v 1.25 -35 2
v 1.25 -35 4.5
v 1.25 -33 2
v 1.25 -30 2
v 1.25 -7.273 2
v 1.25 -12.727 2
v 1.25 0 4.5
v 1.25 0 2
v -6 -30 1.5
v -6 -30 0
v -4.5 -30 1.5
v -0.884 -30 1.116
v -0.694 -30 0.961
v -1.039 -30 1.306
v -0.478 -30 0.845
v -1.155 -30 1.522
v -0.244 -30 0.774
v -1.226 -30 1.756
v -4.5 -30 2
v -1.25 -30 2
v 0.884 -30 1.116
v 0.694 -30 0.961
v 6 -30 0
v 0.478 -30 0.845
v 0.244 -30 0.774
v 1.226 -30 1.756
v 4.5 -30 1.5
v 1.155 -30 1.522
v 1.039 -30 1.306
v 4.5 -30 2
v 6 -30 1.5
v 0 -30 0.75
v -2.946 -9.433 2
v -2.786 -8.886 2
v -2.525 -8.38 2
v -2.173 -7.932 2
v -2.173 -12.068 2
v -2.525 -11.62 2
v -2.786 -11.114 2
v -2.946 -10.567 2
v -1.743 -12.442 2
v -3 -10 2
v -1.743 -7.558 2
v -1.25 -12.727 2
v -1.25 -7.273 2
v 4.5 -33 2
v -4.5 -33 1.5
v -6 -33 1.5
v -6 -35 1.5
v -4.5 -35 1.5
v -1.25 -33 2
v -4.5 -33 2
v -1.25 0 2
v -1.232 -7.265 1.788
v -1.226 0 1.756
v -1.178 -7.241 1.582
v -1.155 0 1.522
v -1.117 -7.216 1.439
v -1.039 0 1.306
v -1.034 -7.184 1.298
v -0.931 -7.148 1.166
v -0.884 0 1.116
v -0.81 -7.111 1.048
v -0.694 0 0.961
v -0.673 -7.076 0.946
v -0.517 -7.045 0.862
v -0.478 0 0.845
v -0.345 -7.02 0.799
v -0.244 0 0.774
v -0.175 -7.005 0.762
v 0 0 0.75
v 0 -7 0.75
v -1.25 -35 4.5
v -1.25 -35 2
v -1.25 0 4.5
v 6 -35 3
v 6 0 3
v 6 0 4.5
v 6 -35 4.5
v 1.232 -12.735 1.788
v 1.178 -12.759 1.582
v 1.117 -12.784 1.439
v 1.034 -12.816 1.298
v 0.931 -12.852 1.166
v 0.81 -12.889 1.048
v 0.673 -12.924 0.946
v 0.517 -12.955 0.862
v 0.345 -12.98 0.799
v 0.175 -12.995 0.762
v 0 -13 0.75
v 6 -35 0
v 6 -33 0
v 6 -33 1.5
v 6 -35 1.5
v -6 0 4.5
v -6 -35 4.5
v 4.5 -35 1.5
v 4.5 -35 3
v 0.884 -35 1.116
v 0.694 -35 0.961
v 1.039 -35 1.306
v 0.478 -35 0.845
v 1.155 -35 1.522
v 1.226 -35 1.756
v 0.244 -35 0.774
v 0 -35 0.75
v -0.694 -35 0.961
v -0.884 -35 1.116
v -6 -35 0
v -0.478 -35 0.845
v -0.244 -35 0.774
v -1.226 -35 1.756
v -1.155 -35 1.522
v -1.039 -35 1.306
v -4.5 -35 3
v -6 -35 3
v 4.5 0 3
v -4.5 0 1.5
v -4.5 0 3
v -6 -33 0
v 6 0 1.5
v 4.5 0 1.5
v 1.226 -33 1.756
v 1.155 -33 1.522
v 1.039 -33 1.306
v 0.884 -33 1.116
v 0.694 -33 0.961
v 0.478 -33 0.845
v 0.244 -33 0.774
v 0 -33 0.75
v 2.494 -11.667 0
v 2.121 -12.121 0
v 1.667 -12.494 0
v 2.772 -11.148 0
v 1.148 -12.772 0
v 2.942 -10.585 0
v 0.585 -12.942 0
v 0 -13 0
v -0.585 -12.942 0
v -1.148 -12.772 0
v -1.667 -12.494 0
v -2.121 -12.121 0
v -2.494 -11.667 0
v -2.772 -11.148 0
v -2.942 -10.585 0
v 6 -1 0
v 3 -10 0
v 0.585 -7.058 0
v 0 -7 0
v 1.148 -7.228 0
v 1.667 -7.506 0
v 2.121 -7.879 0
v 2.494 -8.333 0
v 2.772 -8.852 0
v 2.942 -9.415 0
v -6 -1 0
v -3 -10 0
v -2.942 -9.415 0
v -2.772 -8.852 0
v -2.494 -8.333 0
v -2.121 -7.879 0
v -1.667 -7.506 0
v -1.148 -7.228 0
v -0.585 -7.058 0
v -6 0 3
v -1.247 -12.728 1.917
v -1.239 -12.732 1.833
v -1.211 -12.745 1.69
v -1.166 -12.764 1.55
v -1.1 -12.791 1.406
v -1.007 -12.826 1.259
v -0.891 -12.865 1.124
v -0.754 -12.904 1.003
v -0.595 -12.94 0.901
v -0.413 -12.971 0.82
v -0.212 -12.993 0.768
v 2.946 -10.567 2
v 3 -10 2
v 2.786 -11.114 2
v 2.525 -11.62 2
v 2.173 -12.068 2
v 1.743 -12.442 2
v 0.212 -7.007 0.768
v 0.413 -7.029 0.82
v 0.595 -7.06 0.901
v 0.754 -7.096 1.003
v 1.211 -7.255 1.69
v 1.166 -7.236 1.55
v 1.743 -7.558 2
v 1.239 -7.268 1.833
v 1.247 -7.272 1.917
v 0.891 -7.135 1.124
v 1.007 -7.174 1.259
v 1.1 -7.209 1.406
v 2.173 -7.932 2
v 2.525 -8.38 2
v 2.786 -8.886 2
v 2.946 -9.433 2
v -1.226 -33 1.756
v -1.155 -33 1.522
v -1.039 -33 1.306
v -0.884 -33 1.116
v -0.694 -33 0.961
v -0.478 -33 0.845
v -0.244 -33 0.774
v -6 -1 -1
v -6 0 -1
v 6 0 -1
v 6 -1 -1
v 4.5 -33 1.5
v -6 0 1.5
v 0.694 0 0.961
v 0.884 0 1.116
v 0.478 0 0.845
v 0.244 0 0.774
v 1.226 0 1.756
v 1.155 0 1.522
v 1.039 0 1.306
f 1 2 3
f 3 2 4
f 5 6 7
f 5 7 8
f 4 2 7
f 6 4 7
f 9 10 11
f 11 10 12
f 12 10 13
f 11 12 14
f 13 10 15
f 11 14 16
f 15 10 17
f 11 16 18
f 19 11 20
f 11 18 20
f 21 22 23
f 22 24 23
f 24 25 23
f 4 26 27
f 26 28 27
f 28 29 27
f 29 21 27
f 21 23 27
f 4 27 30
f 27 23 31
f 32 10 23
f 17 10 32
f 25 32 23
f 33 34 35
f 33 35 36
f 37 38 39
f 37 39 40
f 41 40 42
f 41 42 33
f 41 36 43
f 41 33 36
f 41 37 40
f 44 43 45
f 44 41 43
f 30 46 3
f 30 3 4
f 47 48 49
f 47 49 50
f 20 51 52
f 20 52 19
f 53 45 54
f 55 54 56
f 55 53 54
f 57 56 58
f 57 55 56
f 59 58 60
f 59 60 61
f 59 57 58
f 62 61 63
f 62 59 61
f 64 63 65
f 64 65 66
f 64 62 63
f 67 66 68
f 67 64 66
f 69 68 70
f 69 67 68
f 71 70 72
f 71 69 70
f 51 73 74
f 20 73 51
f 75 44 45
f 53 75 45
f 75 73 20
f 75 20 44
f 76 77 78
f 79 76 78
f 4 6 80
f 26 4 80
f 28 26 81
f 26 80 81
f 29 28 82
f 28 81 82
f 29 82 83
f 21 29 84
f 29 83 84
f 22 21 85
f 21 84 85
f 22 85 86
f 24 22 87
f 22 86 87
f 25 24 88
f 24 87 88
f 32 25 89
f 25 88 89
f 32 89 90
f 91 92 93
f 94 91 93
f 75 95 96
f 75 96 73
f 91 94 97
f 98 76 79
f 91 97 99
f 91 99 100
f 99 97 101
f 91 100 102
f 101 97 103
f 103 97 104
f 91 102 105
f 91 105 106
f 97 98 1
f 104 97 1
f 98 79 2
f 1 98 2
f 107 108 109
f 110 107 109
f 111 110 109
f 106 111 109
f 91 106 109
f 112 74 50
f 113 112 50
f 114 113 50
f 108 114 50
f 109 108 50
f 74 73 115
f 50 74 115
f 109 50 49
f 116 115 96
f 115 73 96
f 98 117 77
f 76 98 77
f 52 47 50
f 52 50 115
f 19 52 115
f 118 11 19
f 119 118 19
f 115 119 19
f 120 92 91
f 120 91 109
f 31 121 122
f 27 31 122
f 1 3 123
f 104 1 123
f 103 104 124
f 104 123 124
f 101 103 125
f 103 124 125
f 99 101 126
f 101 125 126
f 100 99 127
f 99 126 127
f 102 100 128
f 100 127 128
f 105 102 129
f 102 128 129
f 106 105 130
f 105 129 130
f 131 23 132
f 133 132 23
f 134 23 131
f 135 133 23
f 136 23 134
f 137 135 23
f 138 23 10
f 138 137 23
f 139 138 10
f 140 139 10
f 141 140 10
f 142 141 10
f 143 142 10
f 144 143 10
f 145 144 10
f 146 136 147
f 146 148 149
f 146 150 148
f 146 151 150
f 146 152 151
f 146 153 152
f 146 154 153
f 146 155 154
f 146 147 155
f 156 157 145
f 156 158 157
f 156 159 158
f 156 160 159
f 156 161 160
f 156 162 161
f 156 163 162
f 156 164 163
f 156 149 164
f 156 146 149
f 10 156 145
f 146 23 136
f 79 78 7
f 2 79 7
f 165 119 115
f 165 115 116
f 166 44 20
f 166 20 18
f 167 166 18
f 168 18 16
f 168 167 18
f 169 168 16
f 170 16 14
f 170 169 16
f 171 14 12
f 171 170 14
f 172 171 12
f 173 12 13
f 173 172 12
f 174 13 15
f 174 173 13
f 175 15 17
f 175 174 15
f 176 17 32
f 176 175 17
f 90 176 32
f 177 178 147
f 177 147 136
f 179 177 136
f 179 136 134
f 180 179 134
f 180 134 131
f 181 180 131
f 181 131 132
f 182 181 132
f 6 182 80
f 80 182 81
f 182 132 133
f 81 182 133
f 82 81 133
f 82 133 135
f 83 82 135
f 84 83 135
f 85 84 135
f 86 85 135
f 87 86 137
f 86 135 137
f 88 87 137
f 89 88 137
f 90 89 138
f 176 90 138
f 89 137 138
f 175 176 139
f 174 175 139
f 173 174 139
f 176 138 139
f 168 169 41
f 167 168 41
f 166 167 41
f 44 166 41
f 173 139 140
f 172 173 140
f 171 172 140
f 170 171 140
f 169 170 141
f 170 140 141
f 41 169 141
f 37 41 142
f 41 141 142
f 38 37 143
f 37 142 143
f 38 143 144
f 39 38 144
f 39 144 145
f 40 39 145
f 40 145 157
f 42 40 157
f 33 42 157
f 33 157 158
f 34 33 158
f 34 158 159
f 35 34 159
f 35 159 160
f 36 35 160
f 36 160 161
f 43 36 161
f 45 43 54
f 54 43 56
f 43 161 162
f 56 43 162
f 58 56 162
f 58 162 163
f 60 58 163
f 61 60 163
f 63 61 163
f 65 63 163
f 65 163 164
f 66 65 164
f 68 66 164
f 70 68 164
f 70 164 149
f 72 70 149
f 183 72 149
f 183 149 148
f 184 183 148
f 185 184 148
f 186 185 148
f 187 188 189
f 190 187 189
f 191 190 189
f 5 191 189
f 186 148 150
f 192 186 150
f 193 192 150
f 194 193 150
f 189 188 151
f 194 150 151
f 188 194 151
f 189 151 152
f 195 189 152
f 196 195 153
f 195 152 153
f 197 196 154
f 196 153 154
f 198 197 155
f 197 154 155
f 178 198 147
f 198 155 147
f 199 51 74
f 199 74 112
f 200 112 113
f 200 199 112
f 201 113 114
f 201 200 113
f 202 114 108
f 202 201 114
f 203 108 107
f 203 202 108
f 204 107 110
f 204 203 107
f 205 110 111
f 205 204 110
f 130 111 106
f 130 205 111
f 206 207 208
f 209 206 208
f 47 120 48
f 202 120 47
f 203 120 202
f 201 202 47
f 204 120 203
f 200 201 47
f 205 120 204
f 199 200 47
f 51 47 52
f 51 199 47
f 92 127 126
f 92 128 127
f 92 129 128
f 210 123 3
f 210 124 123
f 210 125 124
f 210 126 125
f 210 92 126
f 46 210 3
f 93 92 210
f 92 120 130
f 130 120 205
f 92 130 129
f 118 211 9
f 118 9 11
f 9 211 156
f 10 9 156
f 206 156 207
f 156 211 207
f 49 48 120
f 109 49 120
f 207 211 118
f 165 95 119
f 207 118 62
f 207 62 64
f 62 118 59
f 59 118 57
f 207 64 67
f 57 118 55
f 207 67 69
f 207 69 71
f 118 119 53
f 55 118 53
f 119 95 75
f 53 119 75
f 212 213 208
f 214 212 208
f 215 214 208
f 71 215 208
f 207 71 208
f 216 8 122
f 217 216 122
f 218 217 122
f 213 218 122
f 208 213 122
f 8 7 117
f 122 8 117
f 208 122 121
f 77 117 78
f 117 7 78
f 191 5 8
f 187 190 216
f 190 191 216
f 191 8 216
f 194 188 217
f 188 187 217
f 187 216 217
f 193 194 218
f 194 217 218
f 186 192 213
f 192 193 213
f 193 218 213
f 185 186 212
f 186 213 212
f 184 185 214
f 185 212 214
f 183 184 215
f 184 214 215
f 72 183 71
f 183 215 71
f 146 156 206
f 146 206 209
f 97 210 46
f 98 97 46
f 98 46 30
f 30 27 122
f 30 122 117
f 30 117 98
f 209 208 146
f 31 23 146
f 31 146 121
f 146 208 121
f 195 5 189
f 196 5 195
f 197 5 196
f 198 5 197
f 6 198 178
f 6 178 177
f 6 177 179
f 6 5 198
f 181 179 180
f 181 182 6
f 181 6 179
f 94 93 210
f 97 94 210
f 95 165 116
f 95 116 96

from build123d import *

# Parameters (mm, degrees)
F1_DEPTH       = 35
F3_DEPTH       = 1
F4_W           = 3
F4_H           = 2
F5_DEPTH       = 25
F7_D           = 2.5
F7_CBORE_D     = 6
F7_CBORE_DEPTH = 2


with BuildPart() as f1:
    # F0 (on Front) → F1 (new body)
    with BuildSketch(Plane.XZ):
        with BuildLine():
            Line((0, 0.75), (0, 0))
            Line((0, 0), (6, 0))
            Line((6, 0), (6, 1.5))
            Line((6, 1.5), (4.5, 1.5))
            Line((4.5, 1.5), (4.5, 3))
            Line((4.5, 3), (6, 3))
            Line((6, 3), (6, 4.5))
            Line((6, 4.5), (1.25, 4.5))
            Line((1.25, 4.5), (1.25, 2))
            ThreePointArc((1.25, 2), (0.8838834765, 1.1161165235), (0, 0.75))
        make_face()
    extrude(amount=F1_DEPTH)

    # F2: F1 across plane


with BuildPart() as f1_1:
    add(f1.part)
    add(f1.part.mirror(Plane.YZ))

    # F0 (on Front) → F3 (join)
    with BuildSketch(Plane.XZ):
        Polygon((6, 0), (0, 0), (-6, 0), (-6, -1), (6, -1), align=None)
    extrude(amount=F3_DEPTH)

    # F4 (on Right) → F5 (cut, symmetric)
    with BuildSketch(Plane.YZ):
        with Locations((-31.5, 1)):
            Rectangle(F4_W, F4_H)
    extrude(amount=F5_DEPTH, both=True, mode=Mode.SUBTRACT)

    # F7 (through all)
    with Locations(Plane(origin=(0, 0, 0), x_dir=(1, 0, 0), z_dir=(0, 0, -1))):
        with Locations((0, 10)):
            CounterBoreHole(F7_D / 2, F7_CBORE_D / 2, F7_CBORE_DEPTH)


solid = f1_1.part
